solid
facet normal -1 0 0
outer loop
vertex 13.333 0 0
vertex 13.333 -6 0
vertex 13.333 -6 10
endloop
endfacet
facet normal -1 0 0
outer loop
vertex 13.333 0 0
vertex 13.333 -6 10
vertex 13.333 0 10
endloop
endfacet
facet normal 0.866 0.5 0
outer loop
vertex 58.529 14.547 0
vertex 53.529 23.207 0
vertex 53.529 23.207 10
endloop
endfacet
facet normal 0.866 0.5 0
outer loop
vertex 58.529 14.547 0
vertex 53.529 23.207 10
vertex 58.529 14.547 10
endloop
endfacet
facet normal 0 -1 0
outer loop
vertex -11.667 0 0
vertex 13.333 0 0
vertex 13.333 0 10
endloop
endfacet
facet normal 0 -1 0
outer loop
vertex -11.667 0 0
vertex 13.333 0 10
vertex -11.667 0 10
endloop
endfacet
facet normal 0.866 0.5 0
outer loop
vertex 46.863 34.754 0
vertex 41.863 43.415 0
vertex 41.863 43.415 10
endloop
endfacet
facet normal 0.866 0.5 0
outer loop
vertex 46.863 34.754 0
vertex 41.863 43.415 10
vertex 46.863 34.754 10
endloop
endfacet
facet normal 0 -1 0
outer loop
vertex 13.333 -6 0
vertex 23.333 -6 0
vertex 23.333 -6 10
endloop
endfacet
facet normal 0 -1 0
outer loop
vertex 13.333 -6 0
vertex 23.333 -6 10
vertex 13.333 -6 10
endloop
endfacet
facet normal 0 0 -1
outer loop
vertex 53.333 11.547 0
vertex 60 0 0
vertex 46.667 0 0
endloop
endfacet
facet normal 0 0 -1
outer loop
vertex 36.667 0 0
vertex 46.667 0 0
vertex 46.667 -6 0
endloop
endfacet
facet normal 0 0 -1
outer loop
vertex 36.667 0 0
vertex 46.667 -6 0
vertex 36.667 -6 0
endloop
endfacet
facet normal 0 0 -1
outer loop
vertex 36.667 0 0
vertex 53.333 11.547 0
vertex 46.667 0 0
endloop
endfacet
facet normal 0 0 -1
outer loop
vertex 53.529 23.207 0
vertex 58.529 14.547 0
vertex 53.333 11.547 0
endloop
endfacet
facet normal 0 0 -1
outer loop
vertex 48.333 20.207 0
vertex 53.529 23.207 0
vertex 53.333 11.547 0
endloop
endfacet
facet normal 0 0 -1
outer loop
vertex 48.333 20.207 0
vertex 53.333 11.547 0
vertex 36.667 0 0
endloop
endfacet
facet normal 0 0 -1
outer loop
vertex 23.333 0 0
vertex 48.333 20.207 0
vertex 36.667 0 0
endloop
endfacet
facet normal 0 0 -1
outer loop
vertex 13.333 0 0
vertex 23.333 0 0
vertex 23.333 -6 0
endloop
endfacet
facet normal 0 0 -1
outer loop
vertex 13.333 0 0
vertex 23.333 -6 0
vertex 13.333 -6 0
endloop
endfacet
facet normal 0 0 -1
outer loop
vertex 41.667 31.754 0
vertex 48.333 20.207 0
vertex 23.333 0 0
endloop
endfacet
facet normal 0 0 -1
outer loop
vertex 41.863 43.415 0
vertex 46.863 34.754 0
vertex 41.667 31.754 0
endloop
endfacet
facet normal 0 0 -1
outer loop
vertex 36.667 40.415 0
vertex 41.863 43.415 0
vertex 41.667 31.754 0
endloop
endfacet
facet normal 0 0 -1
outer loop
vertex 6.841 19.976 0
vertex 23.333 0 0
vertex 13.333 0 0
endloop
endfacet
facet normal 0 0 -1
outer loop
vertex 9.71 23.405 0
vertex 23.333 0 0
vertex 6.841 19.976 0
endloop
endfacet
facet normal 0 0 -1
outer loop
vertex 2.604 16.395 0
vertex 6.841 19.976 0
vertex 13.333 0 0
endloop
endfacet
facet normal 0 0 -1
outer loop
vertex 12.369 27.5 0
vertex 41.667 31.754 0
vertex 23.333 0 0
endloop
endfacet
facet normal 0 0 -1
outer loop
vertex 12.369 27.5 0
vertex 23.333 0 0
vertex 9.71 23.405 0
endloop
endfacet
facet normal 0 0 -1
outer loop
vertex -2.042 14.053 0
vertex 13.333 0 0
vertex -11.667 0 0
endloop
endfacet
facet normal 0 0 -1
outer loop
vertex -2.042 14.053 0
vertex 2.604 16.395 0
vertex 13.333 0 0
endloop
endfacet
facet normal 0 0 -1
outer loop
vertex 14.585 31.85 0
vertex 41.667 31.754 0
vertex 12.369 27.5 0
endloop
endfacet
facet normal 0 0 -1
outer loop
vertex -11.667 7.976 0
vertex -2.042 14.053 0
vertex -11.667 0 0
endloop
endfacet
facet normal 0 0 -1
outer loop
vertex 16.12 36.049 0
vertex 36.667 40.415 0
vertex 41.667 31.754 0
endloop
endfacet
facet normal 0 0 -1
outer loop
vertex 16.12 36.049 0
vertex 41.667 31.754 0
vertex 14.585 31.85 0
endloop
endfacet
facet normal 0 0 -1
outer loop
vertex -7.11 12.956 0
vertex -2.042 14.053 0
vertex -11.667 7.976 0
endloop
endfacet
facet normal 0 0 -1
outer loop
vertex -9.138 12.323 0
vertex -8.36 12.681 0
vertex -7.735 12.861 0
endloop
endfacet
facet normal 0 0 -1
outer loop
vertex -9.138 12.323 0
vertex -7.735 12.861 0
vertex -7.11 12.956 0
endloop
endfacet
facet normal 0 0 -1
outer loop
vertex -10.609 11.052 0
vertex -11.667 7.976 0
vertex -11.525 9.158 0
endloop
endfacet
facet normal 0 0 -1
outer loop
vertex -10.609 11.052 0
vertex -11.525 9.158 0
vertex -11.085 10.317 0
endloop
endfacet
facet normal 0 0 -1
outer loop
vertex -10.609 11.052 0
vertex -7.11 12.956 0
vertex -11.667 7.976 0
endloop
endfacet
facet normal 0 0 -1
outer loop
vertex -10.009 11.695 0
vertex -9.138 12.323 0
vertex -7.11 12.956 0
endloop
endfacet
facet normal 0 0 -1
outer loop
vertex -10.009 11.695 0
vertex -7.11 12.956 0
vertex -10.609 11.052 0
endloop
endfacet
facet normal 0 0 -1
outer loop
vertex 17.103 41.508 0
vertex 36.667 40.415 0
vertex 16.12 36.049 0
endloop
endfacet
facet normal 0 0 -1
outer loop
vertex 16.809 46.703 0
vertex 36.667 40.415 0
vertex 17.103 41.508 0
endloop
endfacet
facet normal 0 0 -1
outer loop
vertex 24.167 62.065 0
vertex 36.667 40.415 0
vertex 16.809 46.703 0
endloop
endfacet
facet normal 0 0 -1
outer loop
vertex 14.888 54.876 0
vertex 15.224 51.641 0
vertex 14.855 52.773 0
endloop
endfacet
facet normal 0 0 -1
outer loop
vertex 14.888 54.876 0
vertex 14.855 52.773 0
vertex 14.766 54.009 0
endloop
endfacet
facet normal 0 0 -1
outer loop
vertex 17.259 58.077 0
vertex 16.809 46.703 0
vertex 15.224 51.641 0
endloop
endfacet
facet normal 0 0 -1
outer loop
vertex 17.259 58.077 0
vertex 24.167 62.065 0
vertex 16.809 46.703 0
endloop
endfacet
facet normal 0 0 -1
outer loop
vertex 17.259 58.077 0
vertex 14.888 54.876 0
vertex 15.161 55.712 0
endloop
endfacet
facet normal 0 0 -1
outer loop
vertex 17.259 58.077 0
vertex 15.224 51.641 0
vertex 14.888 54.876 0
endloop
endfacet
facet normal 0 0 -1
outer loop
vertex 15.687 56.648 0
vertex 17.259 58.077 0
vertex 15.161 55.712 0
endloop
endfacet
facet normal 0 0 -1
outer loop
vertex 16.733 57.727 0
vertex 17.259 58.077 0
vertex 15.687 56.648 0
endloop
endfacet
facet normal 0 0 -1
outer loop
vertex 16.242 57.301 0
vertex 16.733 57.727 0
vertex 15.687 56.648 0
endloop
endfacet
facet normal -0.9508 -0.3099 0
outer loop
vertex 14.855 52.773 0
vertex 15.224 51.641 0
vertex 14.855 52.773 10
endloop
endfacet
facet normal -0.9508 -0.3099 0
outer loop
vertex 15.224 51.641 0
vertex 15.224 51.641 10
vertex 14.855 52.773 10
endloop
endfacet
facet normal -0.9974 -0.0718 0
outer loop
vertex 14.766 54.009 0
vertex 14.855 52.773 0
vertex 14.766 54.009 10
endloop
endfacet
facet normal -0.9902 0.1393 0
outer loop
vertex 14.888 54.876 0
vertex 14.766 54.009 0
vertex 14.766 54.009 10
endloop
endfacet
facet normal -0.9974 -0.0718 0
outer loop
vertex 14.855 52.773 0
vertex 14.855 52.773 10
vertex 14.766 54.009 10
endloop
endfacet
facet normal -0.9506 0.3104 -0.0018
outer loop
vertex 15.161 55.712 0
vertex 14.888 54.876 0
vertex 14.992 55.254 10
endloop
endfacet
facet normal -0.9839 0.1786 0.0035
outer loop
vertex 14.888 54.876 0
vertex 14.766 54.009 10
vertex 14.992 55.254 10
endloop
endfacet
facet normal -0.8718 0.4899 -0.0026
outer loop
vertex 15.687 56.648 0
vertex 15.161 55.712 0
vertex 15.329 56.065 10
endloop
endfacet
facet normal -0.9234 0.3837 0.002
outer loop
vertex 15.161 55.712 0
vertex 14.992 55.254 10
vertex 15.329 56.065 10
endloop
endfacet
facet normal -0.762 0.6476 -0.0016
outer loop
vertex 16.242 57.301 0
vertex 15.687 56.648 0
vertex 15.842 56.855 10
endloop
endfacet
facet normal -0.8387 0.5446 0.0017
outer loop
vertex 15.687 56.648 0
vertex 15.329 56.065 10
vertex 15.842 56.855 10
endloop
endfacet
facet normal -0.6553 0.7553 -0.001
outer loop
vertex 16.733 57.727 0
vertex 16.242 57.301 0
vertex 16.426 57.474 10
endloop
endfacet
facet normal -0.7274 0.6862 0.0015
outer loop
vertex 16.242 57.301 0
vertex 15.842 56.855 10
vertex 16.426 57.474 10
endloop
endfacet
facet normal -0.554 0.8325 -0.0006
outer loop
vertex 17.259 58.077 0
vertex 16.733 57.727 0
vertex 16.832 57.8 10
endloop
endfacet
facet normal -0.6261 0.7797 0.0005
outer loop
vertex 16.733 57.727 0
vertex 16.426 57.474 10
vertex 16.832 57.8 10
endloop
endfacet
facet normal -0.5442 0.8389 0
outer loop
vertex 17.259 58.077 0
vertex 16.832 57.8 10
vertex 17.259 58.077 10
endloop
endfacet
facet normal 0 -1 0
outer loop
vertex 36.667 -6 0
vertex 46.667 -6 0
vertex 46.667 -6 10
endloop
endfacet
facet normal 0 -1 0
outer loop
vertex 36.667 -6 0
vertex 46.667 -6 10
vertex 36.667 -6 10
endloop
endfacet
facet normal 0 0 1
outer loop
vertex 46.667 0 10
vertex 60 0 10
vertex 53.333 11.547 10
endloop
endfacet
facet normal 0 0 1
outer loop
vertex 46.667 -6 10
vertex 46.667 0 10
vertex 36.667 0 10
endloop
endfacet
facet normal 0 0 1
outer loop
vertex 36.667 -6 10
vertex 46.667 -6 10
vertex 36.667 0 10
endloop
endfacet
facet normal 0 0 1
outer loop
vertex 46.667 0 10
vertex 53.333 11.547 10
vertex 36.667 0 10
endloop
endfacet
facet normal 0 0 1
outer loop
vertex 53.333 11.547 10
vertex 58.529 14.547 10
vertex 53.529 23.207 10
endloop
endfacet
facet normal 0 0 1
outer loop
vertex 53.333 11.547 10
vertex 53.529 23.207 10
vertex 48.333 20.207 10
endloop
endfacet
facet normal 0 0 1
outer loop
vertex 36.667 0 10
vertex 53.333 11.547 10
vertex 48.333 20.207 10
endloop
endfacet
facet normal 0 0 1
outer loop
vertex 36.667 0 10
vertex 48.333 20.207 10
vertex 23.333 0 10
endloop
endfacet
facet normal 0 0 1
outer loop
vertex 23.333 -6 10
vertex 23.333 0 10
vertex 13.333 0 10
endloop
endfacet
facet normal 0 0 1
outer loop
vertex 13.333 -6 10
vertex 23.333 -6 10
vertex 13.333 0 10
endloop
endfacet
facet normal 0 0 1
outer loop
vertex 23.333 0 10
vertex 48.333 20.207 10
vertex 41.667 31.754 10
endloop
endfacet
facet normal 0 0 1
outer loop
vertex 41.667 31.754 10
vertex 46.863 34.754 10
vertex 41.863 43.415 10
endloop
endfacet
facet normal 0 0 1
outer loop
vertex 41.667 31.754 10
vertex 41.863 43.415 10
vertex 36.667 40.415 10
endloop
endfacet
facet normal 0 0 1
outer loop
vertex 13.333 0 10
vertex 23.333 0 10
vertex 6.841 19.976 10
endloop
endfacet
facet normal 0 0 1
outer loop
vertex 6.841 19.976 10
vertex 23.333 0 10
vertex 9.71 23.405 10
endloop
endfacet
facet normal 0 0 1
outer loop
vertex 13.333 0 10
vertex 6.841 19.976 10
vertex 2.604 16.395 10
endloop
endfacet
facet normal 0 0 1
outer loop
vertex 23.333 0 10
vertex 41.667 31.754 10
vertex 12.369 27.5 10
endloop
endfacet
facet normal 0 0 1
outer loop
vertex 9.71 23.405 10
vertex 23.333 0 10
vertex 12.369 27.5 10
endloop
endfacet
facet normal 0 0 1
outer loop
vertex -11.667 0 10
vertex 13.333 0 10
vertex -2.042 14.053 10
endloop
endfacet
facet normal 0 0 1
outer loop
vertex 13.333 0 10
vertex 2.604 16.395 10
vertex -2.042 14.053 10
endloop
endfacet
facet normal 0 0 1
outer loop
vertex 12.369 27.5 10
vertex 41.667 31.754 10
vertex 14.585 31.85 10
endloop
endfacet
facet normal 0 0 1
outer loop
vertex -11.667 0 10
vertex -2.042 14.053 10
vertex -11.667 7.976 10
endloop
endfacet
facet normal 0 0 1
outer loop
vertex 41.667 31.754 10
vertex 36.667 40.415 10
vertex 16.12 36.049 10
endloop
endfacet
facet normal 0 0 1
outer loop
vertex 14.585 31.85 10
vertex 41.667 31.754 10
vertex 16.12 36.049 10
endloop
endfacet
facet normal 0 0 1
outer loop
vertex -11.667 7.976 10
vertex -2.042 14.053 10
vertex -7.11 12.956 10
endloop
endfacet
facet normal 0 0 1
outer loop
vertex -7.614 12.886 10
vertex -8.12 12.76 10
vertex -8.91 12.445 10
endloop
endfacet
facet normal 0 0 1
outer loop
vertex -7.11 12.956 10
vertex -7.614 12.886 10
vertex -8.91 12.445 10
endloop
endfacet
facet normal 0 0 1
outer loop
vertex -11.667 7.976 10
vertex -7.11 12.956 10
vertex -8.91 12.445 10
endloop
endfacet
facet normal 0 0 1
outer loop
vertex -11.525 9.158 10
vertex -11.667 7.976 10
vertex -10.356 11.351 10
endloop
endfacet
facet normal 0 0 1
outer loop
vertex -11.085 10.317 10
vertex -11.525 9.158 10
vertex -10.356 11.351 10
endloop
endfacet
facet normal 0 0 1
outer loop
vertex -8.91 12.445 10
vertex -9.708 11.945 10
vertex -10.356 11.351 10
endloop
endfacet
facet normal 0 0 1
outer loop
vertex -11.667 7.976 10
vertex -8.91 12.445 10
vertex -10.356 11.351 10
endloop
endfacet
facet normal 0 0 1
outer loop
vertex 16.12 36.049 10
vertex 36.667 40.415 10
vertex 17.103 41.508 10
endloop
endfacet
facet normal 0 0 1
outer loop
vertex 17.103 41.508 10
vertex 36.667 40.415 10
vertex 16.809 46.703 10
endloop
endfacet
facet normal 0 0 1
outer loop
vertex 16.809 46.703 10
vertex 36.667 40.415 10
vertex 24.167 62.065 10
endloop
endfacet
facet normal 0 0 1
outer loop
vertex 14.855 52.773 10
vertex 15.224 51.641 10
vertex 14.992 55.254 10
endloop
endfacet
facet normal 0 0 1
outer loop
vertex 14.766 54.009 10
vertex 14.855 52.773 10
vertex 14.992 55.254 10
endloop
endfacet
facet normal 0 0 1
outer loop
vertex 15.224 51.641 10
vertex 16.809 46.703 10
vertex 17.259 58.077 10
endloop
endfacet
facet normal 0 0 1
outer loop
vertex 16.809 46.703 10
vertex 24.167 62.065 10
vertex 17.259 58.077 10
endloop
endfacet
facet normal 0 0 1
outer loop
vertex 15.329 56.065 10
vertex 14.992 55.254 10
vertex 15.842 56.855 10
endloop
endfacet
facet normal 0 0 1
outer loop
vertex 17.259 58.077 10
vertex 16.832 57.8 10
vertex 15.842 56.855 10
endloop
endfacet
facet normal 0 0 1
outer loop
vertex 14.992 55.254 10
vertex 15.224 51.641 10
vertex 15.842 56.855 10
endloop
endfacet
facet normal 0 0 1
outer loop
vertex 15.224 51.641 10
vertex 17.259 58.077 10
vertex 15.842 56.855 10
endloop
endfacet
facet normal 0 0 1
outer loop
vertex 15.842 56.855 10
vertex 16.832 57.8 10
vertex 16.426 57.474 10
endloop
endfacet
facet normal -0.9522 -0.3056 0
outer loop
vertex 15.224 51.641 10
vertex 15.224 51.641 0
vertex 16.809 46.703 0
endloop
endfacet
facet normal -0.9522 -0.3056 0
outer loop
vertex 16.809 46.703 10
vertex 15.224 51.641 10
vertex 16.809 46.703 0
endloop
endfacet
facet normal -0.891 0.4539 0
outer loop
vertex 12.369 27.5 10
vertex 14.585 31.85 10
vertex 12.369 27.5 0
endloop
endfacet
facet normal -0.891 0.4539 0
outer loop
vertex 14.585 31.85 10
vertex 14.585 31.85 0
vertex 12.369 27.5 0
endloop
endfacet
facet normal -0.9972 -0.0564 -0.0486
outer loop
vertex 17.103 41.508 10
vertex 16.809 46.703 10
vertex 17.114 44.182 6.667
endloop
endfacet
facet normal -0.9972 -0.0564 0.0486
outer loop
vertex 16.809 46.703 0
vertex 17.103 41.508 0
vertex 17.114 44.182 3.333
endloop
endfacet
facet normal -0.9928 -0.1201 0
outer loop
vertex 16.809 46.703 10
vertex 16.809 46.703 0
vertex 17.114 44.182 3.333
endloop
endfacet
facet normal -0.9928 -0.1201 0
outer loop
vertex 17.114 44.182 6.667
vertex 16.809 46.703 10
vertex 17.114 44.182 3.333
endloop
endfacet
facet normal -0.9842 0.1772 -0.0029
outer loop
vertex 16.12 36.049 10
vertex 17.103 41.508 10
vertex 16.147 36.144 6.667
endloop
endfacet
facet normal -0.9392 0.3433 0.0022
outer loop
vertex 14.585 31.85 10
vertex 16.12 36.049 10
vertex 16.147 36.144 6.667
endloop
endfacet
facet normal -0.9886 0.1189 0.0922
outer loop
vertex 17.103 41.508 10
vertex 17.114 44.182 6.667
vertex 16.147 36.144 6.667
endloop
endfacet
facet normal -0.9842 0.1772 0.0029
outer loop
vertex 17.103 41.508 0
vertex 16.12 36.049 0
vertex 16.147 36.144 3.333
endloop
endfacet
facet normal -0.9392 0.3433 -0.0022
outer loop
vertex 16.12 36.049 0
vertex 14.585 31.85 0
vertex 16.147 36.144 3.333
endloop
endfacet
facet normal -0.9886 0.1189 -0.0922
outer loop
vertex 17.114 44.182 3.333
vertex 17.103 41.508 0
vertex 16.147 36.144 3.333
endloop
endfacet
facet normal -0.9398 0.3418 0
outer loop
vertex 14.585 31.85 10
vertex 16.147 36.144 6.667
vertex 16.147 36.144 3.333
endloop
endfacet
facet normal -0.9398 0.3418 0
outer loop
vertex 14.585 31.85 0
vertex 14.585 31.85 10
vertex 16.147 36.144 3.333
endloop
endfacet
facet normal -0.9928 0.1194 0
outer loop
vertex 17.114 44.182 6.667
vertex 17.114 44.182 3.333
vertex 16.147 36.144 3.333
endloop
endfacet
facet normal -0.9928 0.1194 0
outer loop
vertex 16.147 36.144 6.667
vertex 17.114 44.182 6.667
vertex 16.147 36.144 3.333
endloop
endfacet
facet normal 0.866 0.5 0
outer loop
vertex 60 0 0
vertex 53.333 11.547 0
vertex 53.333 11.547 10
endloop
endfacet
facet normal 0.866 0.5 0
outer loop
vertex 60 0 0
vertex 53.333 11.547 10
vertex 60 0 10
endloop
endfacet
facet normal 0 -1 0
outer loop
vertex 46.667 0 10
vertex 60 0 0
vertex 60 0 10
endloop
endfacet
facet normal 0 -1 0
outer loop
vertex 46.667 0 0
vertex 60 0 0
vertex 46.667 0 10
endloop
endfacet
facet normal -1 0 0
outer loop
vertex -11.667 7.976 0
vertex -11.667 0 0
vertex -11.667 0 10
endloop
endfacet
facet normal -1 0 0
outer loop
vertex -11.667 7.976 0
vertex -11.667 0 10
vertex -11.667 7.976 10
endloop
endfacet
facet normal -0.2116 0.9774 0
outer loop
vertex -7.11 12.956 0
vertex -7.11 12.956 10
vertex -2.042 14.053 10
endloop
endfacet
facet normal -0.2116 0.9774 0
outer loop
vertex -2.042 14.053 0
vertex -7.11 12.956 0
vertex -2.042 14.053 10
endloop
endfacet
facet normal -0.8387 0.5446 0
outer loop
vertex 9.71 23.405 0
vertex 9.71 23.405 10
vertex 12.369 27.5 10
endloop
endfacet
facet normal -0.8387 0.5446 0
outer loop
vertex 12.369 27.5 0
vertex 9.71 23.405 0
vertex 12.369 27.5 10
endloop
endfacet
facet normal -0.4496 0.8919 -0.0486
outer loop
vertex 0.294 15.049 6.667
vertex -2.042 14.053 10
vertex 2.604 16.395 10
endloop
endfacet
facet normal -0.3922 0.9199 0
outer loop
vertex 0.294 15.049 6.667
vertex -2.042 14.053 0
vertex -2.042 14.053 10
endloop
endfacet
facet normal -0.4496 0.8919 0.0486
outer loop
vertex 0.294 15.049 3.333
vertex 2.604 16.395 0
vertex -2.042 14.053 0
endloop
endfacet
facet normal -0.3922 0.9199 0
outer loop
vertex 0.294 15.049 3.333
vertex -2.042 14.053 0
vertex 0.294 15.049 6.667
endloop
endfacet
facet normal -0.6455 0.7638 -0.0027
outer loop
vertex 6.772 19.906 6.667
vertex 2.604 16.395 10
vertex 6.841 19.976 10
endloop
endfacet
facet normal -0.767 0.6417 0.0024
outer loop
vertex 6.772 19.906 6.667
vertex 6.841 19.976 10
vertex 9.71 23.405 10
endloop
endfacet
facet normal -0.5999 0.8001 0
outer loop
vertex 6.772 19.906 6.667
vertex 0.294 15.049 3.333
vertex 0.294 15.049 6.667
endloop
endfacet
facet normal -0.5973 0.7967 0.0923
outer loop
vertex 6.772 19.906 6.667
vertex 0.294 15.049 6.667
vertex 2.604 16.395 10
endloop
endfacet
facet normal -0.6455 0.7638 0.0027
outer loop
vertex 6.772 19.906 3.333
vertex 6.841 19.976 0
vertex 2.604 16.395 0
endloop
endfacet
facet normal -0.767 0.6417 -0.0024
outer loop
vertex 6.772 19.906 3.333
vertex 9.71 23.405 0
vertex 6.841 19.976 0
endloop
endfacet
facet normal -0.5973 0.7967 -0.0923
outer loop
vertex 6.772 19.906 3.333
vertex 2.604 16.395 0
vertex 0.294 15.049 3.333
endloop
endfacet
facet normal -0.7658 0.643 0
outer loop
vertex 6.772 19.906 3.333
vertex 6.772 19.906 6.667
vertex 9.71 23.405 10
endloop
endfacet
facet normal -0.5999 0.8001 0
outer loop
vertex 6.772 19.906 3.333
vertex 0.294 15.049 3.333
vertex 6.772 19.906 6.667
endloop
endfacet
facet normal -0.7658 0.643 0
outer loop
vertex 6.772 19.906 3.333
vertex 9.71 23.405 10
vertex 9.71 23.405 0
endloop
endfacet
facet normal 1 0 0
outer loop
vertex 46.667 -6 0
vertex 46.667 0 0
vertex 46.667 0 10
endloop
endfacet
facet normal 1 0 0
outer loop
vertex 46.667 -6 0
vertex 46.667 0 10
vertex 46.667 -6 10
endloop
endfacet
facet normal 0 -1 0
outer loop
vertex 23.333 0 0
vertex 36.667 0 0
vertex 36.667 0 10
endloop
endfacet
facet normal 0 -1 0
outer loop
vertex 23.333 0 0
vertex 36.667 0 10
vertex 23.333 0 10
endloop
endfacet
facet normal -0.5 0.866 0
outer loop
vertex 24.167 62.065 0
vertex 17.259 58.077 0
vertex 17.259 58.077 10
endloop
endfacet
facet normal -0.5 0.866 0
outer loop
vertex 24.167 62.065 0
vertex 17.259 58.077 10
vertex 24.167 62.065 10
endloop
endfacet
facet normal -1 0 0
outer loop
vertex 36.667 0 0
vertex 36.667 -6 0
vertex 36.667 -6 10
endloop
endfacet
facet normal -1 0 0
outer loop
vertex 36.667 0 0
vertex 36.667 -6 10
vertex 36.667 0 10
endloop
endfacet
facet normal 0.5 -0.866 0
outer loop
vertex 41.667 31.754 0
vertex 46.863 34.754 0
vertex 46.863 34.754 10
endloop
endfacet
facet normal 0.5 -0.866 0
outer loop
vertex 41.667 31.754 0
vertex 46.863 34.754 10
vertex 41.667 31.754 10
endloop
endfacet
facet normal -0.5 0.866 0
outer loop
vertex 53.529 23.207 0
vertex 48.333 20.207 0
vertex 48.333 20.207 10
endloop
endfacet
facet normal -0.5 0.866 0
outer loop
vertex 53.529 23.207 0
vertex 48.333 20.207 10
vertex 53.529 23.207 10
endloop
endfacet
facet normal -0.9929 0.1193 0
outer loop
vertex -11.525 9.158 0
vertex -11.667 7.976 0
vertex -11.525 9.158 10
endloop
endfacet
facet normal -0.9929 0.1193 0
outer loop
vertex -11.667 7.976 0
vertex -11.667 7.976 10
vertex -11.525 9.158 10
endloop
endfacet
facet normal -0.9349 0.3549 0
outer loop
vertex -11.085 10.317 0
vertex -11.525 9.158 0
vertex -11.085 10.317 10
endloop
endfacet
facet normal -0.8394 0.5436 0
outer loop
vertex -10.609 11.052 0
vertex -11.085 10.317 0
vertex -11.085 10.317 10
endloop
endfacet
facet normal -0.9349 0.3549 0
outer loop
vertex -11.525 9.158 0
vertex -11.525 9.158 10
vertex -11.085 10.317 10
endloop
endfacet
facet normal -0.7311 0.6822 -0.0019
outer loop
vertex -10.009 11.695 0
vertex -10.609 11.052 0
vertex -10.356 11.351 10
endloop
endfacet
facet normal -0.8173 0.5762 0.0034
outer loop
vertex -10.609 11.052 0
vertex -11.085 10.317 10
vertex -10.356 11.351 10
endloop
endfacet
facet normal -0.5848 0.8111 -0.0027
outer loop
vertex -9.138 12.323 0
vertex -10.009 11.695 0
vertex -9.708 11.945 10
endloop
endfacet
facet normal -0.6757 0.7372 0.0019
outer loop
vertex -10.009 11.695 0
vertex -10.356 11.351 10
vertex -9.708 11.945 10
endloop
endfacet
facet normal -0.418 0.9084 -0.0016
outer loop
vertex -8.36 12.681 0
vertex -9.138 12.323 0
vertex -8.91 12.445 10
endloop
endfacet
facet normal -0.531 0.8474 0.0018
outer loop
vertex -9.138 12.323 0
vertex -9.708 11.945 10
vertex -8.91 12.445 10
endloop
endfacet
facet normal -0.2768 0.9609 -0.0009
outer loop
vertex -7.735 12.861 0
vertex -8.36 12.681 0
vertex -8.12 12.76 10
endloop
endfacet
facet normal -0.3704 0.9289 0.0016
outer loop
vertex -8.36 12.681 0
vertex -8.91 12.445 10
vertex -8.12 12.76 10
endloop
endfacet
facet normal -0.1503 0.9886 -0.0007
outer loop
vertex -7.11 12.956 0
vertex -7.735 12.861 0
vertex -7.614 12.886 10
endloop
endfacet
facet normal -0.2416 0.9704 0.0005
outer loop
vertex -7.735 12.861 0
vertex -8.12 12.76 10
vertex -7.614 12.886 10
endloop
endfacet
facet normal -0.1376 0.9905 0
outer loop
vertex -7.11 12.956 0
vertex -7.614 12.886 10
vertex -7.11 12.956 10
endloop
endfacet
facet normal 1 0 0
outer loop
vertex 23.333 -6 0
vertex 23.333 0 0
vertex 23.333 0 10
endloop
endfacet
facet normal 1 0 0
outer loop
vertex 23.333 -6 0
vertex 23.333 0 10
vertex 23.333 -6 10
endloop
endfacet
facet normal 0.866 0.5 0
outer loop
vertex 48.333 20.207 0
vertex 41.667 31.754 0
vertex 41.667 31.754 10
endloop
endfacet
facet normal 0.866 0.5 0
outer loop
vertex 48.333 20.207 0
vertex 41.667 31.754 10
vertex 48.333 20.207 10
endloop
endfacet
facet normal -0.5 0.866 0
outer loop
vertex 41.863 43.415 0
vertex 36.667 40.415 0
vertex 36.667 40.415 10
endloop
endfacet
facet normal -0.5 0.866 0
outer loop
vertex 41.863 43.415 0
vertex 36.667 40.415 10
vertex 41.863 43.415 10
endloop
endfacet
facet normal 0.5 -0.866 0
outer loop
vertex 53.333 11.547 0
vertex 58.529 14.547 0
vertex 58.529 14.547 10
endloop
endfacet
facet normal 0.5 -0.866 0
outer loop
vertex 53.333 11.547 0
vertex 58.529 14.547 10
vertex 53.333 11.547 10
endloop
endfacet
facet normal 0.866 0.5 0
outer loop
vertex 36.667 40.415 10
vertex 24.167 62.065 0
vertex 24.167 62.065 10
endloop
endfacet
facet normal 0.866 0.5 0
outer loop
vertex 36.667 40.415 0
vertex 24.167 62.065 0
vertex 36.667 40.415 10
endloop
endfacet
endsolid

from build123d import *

# Parameters (mm, degrees)
BOSS_EXTRUDE1_DEPTH = 10
FILLET1_R           = 5


with BuildPart() as part:
    # Sketch1 → Boss-Extrude1 (new body)
    with BuildSketch(Plane.XY):
        with BuildLine():
            Line((36.66666666, -6), (36.66666666, 0))
            Line((36.66666666, 0), (23.33333333, 0))
            Line((23.33333333, 0), (23.33333333, -6))
            Line((23.33333333, -6), (13.33333333, -6))
            Line((13.33333333, -6), (13.33333333, 0))
            Line((13.33333333, 0), (-11.66666667, 0))
            Line((-11.66666667, 0), (-11.66666667, 13))
            add(Edge.make_bspline(
                [(-11.66666667, 13), (-1.66449563, 11.980359681), (6.23568211, 16.877469798), (12.368602782, 27.5)],
                knots=[0, 0, 0, 0, 1, 1, 1, 1], degree=3))
            add(Edge.make_bspline(
                [(12.908336411, 55.565153932), (18.792456349, 47.412839878), (18.501523453, 38.122530202), (12.368602782, 27.5)],
                knots=[0, 0, 0, 0, 1, 1, 1, 1], degree=3))
            Line((12.908336411, 55.565153932), (24.16666666, 62.065153932))
            Line((24.16666666, 62.065153932), (36.66666666, 40.414518838))
            Line((36.66666666, 40.414518838), (41.862819083, 43.414518838))
            Line((41.862819083, 43.414518838), (46.862819083, 34.7542648))
            Line((46.862819083, 34.7542648), (41.66666666, 31.7542648))
            Line((41.66666666, 31.7542648), (48.333333325, 20.207259419))
            Line((48.333333325, 20.207259419), (53.529485748, 23.207259419))
            Line((53.529485748, 23.207259419), (58.529485748, 14.547005381))
            Line((58.529485748, 14.547005381), (53.333333325, 11.547005381))
            Line((53.333333325, 11.547005381), (59.99999999, 0))
            Line((59.99999999, 0), (46.66666666, 0))
            Line((46.66666666, 0), (46.66666666, -6))
            Line((46.66666666, -6), (36.66666666, -6))
        make_face()
    extrude(amount=BOSS_EXTRUDE1_DEPTH)

    # Fillet1
    fillet1_edges = [part.edges().sort_by_distance(p)[0] for p in [
        (-11.66666667, 13, 5),
        (12.908336411, 55.565153932, 5),
    ]]
    fillet(fillet1_edges, radius=FILLET1_R)


solid = part.part
